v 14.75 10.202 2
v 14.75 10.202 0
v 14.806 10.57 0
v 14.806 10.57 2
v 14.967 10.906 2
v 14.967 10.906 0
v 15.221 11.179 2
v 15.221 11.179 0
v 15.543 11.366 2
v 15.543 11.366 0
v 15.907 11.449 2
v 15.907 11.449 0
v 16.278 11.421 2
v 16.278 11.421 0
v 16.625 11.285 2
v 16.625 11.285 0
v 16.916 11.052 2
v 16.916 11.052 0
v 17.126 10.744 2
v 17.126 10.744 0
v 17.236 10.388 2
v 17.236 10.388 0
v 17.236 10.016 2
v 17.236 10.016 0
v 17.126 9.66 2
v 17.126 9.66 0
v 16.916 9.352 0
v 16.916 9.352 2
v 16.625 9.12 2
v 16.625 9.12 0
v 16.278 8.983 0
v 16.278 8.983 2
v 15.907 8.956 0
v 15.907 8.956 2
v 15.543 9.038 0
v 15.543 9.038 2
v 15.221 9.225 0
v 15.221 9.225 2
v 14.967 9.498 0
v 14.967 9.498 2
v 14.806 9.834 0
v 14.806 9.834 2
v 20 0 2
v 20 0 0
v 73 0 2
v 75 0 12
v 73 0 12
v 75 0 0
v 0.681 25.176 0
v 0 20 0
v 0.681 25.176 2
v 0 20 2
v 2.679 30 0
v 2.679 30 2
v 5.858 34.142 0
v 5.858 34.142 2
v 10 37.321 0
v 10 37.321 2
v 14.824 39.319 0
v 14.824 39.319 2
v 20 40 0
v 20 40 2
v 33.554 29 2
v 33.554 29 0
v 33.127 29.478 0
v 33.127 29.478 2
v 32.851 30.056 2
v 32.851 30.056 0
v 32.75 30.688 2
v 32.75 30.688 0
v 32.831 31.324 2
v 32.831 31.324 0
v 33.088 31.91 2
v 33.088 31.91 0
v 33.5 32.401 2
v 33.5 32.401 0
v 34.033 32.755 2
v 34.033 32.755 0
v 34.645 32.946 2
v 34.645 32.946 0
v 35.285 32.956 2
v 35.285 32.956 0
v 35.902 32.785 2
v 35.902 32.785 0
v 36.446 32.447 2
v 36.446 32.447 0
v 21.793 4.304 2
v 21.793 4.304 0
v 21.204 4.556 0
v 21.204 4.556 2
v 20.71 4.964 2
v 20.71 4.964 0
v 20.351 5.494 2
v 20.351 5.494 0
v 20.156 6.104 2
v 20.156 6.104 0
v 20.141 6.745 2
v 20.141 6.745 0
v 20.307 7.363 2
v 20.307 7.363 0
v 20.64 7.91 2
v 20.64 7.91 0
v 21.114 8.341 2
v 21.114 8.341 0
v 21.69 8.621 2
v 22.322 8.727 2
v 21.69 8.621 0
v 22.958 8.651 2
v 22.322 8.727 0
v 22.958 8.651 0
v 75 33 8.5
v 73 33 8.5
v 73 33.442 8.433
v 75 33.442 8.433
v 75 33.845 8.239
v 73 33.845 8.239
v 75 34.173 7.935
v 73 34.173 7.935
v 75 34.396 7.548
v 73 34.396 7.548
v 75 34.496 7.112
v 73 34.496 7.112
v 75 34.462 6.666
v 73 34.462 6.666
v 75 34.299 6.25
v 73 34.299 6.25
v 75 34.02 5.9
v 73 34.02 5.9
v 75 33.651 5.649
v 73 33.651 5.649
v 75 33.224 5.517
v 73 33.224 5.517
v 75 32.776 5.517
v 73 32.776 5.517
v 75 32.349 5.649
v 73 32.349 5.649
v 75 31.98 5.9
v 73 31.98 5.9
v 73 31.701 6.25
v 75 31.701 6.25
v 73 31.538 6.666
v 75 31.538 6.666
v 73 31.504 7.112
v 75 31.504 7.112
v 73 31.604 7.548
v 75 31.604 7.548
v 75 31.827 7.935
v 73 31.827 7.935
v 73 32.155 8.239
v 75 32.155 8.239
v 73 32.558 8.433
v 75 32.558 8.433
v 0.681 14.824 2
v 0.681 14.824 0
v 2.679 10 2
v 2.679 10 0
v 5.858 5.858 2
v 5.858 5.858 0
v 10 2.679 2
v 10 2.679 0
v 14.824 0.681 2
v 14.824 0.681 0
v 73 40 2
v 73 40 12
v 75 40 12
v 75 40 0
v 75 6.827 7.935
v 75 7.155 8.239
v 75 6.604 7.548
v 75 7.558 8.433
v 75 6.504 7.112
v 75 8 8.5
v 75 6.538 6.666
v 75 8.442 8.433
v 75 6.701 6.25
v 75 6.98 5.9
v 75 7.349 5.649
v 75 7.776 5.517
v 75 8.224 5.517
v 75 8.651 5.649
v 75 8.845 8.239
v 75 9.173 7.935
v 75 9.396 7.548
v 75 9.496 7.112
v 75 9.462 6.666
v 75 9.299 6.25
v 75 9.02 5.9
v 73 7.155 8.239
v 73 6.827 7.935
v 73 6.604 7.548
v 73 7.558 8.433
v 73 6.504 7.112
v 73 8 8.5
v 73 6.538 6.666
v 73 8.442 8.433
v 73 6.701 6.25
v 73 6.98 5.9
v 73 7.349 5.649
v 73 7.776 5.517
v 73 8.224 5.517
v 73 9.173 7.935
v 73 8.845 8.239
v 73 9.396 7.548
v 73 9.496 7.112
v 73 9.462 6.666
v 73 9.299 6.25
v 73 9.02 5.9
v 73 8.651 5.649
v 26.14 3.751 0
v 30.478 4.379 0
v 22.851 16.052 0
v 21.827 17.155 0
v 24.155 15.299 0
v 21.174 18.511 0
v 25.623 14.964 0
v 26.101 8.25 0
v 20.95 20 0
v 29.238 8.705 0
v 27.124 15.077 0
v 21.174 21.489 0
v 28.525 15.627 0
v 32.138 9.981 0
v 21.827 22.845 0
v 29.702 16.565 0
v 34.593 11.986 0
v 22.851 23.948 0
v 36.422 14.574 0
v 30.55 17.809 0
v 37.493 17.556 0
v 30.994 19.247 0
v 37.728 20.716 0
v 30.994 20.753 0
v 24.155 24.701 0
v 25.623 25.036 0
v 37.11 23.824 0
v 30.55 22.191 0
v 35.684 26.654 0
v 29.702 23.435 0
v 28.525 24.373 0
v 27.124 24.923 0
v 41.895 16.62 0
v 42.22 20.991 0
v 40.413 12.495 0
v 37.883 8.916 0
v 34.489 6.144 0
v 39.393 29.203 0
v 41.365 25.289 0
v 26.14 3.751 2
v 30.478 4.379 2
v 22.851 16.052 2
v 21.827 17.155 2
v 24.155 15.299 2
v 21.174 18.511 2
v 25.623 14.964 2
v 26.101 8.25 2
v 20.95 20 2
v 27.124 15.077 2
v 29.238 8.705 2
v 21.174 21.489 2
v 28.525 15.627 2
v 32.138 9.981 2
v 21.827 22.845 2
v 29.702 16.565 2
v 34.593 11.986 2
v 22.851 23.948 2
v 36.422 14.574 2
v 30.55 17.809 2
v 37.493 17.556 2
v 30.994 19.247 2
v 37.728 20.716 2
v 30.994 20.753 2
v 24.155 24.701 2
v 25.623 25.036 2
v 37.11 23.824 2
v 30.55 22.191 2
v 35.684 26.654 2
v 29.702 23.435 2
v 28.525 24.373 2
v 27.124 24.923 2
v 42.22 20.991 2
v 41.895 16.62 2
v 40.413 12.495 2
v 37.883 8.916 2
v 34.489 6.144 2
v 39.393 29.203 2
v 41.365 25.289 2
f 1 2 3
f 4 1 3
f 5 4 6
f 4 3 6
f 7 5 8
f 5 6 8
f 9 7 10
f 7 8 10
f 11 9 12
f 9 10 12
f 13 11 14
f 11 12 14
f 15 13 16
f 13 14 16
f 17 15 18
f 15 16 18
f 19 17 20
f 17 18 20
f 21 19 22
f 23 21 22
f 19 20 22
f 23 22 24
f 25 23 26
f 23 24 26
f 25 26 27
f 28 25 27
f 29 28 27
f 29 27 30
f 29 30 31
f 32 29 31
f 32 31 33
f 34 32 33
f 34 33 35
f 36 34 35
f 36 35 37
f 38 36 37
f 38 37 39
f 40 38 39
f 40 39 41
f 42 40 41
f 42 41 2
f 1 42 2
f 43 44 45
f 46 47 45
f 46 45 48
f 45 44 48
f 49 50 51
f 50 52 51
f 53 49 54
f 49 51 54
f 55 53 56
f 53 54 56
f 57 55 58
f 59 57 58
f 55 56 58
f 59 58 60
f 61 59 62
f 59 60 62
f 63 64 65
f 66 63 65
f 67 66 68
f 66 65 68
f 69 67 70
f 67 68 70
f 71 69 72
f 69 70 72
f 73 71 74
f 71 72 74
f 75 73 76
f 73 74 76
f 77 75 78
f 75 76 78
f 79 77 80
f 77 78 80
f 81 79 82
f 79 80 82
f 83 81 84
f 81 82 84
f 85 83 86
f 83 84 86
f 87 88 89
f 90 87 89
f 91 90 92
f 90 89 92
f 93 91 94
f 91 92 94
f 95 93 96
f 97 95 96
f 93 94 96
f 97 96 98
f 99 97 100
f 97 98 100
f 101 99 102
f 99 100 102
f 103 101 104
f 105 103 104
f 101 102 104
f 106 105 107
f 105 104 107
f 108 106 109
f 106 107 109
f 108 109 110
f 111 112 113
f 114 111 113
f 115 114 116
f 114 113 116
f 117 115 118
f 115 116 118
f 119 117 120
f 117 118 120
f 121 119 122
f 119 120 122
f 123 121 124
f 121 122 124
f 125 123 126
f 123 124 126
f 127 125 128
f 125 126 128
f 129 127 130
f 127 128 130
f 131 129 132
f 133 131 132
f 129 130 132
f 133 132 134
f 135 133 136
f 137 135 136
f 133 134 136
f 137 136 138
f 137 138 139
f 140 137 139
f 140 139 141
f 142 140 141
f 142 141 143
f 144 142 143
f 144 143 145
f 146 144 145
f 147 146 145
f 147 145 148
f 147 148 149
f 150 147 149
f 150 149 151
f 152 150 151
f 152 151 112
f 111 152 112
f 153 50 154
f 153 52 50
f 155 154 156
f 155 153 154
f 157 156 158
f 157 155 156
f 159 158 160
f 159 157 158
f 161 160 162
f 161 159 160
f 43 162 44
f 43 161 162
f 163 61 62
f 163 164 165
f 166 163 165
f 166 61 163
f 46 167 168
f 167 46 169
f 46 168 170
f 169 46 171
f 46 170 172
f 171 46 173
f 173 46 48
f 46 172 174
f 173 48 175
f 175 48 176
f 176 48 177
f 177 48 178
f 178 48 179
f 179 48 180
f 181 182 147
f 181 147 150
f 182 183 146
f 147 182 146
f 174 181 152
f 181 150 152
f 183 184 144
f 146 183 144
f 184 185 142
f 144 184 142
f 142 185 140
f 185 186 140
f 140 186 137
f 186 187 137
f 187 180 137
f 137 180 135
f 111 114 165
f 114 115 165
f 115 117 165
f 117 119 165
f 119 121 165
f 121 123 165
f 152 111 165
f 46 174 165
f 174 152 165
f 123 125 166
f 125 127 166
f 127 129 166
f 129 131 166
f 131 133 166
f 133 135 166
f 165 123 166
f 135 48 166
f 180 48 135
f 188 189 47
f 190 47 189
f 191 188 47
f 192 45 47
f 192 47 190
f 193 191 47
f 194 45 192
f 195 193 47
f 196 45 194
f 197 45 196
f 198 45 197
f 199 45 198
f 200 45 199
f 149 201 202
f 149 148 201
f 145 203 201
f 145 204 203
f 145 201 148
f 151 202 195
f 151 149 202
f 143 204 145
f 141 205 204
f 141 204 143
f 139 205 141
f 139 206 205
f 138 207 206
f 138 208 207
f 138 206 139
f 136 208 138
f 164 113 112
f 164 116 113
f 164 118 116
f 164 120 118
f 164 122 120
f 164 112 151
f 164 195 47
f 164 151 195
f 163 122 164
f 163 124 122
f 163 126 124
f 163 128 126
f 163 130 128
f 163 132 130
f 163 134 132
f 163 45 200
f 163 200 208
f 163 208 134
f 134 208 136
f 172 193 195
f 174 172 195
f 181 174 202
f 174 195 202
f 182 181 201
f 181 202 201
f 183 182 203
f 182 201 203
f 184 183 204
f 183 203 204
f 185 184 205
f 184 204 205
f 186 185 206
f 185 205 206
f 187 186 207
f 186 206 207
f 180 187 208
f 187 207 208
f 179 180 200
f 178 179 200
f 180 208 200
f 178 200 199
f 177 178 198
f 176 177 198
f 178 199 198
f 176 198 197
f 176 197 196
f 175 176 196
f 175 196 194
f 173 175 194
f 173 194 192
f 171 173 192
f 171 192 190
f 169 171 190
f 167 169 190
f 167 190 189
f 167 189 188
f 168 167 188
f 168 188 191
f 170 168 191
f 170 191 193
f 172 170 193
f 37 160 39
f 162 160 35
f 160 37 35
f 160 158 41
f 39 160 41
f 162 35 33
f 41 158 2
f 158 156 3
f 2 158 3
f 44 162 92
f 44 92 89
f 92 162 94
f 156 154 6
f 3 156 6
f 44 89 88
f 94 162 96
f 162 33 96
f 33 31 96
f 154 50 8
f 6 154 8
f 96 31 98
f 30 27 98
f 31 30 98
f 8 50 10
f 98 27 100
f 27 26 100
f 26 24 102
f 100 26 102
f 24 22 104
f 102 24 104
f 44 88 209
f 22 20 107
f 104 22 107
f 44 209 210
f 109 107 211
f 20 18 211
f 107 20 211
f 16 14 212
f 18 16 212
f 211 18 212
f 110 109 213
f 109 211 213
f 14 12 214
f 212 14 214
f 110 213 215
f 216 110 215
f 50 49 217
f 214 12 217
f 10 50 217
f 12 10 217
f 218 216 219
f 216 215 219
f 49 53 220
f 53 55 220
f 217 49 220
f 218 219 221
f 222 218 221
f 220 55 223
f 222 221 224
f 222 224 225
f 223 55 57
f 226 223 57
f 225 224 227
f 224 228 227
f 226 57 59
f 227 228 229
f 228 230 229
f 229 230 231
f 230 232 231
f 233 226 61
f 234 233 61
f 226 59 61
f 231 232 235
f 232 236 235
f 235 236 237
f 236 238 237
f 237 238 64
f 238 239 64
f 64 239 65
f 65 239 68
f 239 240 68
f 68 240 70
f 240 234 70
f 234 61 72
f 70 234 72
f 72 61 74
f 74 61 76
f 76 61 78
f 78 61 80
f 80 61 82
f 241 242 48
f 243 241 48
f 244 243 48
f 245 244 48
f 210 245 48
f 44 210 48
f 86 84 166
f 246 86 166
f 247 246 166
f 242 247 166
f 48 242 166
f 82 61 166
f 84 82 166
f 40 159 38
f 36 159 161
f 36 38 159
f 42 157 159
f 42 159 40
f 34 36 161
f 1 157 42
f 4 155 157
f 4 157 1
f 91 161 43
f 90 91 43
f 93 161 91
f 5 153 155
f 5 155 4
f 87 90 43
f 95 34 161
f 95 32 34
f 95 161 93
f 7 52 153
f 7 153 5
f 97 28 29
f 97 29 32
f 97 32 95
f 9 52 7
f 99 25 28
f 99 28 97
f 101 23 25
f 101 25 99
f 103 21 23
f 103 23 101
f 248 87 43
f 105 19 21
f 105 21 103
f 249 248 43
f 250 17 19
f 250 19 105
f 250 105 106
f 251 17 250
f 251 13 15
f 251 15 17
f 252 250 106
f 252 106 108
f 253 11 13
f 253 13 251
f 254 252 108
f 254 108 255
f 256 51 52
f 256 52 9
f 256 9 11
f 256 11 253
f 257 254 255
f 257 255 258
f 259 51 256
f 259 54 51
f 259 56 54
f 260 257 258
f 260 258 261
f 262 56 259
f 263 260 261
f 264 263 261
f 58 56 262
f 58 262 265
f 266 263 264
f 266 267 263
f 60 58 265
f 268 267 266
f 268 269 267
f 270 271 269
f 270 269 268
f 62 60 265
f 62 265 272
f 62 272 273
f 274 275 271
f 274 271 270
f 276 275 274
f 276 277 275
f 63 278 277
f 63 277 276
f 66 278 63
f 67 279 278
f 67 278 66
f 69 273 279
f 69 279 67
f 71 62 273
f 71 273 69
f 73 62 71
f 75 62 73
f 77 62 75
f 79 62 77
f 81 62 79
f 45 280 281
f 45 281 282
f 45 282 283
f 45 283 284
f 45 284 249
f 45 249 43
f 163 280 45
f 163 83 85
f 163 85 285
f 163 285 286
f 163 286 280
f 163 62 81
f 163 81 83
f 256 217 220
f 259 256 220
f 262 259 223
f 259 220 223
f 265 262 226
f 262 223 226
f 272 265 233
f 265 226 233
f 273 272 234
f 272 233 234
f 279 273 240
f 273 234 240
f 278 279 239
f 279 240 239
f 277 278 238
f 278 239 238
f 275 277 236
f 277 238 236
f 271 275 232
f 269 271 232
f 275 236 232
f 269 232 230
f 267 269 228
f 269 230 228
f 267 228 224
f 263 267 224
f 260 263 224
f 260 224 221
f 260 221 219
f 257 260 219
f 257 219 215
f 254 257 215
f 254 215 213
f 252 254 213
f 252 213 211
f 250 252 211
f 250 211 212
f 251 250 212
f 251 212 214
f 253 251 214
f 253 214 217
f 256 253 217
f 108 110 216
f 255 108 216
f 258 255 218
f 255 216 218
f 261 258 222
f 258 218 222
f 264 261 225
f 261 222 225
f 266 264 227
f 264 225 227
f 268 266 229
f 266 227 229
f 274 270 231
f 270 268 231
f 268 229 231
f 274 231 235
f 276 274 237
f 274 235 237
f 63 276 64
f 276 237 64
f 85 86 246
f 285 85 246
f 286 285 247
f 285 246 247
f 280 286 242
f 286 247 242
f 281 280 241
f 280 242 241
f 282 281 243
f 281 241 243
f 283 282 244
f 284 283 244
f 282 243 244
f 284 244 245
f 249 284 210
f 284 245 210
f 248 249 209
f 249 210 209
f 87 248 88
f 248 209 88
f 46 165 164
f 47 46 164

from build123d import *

# Parameters (mm, degrees)
SKETCH_2_W          = 75
SKETCH_2_H          = 40
EXTRUDE_1_DEPTH     = 2
SKETCH_3_R          = 5.05
SKETCH_3_R_2        = 1.25
CUT_EXTRUDE_1_DEPTH = 86.023526156
FILLET_1_R          = 20
SKETCH_7_W          = 2
SKETCH_7_H          = 40
EXTRUDE_3_DEPTH     = 12
SKETCH_8_R          = 1.5
CUT_EXTRUDE_2_DEPTH = 10


with BuildPart() as part:
    # 草图2 → 凸台-拉伸1 (new body)
    with BuildSketch(Plane.XY):
        with Locations((37.5, 20)):
            Rectangle(SKETCH_2_W, SKETCH_2_H)
    extrude(amount=EXTRUDE_1_DEPTH)

    # 草图3 → 切除-拉伸1 (cut, through all)
    with BuildSketch(Plane(origin=(0, 0, 0), x_dir=(-1, 0, 0), z_dir=(0, 0, -1))):
        with Locations((-26, 20)):
            Circle(SKETCH_3_R)
        with Locations((-16, 10.202041029)):
            Circle(SKETCH_3_R_2)
        with BuildLine():
            ThreePointArc((-36.446428571, 32.447274003), (-40.413244876, 12.495276677), (-21.792765741, 4.30408716))
            ThreePointArc((-21.792765741, 4.30408716), (-20.20202563, 7.059907527), (-22.957845998, 8.650647638))
            ThreePointArc((-22.957845998, 8.650647638), (-36.421884756, 14.573507751), (-33.553571429, 29.000336587))
            ThreePointArc((-33.553571429, 29.000336587), (-33.276531292, 32.170233866), (-36.446428571, 32.447274003))
        make_face()
    extrude(amount=-CUT_EXTRUDE_1_DEPTH, mode=Mode.SUBTRACT)

    # 圆角1
    fillet_1_edges = [part.edges().sort_by_distance(p)[0] for p in [
        (0, 40, 1),
        (0, 0, 1),
    ]]
    fillet(fillet_1_edges, radius=FILLET_1_R - 0.0001)  # a hair under: the kernel refuses the full size

    # 草图7 → 凸台-拉伸3 (add)
    with BuildSketch(Plane(origin=(0, 0, 0), x_dir=(-1, 0, 0), z_dir=(0, 0, -1))):
        with Locations((-74, 20)):
            Rectangle(SKETCH_7_W, SKETCH_7_H)
    extrude(amount=-EXTRUDE_3_DEPTH)

    # 草图8 → 切除-拉伸2 (cut)
    with BuildSketch(Plane.ZY.offset(-73)):
        with Locations((7, 33)):
            Circle(SKETCH_8_R)
        with Locations((7, 8)):
            Circle(SKETCH_8_R)
    extrude(amount=-CUT_EXTRUDE_2_DEPTH, mode=Mode.SUBTRACT)


solid = part.part
